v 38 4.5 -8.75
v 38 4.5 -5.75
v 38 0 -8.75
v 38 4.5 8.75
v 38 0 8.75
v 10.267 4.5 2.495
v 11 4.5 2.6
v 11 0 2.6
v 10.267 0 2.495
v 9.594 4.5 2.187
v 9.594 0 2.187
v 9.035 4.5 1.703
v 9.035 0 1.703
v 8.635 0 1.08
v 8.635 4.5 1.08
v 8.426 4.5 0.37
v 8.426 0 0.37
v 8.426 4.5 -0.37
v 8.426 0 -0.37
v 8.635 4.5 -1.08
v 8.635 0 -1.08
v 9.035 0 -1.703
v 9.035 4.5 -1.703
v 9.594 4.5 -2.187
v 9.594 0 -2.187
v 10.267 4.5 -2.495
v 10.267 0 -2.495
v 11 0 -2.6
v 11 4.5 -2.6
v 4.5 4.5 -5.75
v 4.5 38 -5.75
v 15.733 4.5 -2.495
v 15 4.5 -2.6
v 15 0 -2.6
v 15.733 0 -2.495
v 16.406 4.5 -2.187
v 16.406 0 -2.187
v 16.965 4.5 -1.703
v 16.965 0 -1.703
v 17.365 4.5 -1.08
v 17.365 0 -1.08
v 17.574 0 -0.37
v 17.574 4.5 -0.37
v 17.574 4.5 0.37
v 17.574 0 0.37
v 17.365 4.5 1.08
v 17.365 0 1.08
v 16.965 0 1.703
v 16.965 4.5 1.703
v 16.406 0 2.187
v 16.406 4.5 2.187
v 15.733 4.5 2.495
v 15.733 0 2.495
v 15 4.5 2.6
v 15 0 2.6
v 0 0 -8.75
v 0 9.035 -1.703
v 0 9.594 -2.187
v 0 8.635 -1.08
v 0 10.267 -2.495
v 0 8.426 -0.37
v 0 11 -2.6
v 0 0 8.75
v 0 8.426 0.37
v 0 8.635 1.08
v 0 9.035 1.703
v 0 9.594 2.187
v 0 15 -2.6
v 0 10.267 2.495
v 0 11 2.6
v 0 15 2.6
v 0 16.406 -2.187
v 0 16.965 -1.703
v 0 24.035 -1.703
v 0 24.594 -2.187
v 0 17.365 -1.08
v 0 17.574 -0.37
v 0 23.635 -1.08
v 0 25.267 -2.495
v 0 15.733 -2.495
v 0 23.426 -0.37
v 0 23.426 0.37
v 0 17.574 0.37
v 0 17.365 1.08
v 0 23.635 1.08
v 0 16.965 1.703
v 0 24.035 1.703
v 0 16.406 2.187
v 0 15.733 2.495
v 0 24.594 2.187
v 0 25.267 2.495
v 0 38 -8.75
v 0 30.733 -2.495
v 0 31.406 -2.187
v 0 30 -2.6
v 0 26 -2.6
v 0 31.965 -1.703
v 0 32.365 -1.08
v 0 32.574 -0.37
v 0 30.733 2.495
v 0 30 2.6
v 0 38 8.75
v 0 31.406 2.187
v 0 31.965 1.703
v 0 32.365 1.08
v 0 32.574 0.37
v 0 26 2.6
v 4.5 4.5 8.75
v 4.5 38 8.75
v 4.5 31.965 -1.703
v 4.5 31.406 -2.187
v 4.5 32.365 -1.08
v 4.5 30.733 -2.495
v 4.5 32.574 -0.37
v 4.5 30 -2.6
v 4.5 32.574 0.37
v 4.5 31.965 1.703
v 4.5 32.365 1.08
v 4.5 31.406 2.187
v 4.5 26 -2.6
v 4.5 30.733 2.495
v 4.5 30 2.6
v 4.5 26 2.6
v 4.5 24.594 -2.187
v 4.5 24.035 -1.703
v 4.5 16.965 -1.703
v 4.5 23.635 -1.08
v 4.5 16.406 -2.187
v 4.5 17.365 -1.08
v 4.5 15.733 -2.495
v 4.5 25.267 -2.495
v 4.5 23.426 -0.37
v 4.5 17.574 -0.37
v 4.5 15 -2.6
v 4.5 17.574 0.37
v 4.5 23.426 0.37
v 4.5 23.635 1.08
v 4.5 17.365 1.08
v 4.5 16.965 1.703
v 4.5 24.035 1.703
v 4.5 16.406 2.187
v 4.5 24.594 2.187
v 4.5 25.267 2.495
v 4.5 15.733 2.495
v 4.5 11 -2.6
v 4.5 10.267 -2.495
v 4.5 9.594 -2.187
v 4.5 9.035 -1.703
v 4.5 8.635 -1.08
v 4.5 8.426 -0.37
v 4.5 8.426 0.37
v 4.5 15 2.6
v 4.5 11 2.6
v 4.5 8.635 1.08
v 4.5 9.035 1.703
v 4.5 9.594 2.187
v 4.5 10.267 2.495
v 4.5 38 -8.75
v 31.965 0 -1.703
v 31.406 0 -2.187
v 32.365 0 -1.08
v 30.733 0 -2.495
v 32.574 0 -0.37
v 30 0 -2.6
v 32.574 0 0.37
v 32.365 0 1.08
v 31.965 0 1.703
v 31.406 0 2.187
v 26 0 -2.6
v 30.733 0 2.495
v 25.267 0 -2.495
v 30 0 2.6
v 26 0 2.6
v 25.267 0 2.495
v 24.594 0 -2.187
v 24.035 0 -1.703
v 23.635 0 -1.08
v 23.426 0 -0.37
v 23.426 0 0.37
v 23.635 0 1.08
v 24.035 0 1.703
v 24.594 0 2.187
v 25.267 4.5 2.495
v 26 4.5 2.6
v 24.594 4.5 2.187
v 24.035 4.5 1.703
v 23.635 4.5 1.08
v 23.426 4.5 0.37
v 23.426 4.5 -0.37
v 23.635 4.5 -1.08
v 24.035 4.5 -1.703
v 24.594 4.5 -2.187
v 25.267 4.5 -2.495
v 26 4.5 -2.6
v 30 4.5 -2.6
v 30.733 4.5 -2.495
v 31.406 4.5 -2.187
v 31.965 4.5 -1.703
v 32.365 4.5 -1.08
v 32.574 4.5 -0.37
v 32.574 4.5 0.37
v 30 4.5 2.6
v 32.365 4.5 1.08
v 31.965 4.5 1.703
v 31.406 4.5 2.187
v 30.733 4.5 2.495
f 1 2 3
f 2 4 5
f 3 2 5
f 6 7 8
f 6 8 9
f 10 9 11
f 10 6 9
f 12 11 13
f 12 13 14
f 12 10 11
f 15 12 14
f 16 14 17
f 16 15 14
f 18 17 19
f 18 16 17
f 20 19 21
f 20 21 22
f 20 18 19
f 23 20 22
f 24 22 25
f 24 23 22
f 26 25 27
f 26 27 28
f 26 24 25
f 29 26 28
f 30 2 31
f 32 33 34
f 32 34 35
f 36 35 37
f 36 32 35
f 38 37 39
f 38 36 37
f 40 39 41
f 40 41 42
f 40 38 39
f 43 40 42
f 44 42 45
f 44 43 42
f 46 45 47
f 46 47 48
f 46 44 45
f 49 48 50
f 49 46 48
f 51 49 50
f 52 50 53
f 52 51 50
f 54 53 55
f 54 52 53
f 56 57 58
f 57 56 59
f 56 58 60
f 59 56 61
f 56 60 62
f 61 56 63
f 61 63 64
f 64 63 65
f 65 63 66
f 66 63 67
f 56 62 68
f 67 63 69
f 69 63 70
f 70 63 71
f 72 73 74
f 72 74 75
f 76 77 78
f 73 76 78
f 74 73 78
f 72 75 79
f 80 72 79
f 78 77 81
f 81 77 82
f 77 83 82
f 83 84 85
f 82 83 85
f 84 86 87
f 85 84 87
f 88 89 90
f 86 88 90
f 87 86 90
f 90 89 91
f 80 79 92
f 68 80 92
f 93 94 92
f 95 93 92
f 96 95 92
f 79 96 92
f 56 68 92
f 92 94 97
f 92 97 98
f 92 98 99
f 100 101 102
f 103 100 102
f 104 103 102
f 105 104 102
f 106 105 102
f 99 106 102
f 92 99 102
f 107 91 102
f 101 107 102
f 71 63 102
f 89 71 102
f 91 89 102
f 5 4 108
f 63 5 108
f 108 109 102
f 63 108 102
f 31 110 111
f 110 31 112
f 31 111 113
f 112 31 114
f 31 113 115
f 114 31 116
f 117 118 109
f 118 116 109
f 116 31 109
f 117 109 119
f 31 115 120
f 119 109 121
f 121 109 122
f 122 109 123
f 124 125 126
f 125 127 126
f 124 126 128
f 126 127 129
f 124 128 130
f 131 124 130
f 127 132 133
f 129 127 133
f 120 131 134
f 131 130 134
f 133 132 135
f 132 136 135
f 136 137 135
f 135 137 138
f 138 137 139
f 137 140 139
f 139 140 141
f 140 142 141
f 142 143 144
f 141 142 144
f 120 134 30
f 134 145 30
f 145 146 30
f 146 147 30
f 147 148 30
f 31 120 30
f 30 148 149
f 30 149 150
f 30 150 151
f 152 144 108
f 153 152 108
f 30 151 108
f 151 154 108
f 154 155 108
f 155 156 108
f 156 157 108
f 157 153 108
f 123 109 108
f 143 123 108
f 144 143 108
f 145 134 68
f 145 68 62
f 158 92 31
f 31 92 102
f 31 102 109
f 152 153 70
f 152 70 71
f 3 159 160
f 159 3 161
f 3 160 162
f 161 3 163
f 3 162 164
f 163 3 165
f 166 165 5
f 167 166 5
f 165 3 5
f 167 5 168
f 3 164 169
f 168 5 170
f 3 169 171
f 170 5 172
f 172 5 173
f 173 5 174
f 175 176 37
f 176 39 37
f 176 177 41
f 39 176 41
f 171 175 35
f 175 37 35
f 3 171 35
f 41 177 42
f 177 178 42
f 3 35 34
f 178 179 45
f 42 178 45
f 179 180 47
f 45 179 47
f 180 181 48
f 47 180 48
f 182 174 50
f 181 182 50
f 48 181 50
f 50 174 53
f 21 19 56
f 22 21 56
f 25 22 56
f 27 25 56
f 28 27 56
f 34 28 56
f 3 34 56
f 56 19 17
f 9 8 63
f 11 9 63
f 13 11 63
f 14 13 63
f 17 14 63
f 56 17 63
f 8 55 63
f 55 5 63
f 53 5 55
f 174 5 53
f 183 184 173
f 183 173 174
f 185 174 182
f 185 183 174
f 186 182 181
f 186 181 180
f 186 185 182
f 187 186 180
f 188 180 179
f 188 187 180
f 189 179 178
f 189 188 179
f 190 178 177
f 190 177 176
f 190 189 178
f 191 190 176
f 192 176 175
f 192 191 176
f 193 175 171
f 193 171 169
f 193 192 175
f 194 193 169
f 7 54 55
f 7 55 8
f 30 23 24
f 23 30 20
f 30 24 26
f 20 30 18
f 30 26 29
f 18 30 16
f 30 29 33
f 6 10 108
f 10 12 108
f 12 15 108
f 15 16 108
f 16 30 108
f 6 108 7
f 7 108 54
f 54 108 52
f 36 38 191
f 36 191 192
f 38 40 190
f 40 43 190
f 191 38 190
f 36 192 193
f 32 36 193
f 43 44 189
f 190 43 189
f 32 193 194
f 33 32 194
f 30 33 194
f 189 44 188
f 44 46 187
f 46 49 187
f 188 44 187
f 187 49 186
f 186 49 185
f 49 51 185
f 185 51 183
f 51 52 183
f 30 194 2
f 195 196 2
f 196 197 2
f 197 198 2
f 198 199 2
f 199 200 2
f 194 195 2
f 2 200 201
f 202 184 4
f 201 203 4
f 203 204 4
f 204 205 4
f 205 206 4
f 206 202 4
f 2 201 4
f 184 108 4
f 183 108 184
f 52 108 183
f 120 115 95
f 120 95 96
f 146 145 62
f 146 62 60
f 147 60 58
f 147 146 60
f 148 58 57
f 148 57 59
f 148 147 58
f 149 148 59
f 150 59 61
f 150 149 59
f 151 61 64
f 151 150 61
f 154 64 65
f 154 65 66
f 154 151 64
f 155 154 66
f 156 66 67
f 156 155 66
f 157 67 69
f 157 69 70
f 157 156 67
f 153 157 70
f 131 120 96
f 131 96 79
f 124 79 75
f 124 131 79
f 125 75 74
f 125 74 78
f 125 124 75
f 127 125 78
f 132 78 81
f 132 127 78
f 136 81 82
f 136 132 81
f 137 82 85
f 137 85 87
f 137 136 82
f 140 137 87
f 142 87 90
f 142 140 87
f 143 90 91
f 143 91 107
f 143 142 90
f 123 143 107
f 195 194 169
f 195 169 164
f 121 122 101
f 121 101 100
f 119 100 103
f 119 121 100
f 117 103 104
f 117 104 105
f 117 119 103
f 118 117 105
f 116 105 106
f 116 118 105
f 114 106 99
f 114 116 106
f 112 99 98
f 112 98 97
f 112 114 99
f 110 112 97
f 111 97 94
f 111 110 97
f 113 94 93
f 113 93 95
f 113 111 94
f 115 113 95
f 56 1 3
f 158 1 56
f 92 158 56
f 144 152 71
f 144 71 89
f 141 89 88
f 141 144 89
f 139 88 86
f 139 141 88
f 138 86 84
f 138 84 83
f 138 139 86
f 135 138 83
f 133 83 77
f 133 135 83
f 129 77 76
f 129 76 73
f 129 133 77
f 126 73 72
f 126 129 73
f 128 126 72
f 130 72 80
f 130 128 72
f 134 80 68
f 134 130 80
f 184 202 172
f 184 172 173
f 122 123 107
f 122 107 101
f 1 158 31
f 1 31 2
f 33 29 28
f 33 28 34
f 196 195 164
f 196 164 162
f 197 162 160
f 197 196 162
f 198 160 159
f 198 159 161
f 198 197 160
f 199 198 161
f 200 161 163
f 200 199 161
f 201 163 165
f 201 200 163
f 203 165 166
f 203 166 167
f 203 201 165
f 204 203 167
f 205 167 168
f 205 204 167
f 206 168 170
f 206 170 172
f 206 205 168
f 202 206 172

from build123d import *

# Parameters (mm, degrees)
BOSS_EXTRUDE1_DEPTH = 8.75
BOSS_EXTRUDE2_DEPTH = 3
CUT_EXTRUDE1_DEPTH  = 4.5
CUT_EXTRUDE2_DEPTH  = 4.5


with BuildPart() as part:
    # Sketch1 → Boss-Extrude1 (new, symmetric)
    with BuildSketch(Plane.XY):
        Polygon((0, 0), (0, 38), (4.5, 38), (4.5, 4.5), (38, 4.5), (38, 0), align=None)
    extrude(amount=BOSS_EXTRUDE1_DEPTH, both=True)

    # Sketch2 → Boss-Extrude2 (add)
    with BuildSketch(Plane(origin=(0, 0, -8.75), x_dir=(-1, 0, 0), z_dir=(0, 0, -1))):
        Polygon((-4.5, 38), (-38, 4.5), (-38, 0), (0, 0), (0, 38), align=None)
    extrude(amount=-BOSS_EXTRUDE2_DEPTH)

    # Sketch3 → Cut-Extrude1 (cut)
    with BuildSketch(Plane(origin=(0, 4.5, 0), x_dir=(1, 0, 0), z_dir=(0, 1, 0))):
        with BuildLine():
            Line((30, -2.6), (26, -2.6))
            ThreePointArc((26, -2.6), (23.4, 0), (26, 2.6))
            Line((26, 2.6), (30, 2.6))
            ThreePointArc((30, 2.6), (32.6, 0), (30, -2.6))
        make_face()
        with BuildLine():
            Line((11, 2.6), (15, 2.6))
            ThreePointArc((15, 2.6), (17.6, 0), (15, -2.6))
            Line((15, -2.6), (11, -2.6))
            ThreePointArc((11, -2.6), (8.4, 0), (11, 2.6))
        make_face()
    extrude(amount=-CUT_EXTRUDE1_DEPTH, mode=Mode.SUBTRACT)

    # Sketch4 → Cut-Extrude2 (cut)
    with BuildSketch(Plane(origin=(4.5, 0, 0), x_dir=(0, 0, -1), z_dir=(1, 0, 0))):
        with BuildLine():
            Line((2.6, 30), (2.6, 26))
            ThreePointArc((2.6, 26), (0, 23.4), (-2.6, 26))
            Line((-2.6, 26), (-2.6, 30))
            ThreePointArc((-2.6, 30), (0, 32.6), (2.6, 30))
        make_face()
        with BuildLine():
            Line((2.6, 15), (2.6, 11))
            ThreePointArc((2.6, 11), (0, 8.4), (-2.6, 11))
            Line((-2.6, 11), (-2.6, 15))
            ThreePointArc((-2.6, 15), (0, 17.6), (2.6, 15))
        make_face()
    extrude(amount=-CUT_EXTRUDE2_DEPTH, mode=Mode.SUBTRACT)


solid = part.part
